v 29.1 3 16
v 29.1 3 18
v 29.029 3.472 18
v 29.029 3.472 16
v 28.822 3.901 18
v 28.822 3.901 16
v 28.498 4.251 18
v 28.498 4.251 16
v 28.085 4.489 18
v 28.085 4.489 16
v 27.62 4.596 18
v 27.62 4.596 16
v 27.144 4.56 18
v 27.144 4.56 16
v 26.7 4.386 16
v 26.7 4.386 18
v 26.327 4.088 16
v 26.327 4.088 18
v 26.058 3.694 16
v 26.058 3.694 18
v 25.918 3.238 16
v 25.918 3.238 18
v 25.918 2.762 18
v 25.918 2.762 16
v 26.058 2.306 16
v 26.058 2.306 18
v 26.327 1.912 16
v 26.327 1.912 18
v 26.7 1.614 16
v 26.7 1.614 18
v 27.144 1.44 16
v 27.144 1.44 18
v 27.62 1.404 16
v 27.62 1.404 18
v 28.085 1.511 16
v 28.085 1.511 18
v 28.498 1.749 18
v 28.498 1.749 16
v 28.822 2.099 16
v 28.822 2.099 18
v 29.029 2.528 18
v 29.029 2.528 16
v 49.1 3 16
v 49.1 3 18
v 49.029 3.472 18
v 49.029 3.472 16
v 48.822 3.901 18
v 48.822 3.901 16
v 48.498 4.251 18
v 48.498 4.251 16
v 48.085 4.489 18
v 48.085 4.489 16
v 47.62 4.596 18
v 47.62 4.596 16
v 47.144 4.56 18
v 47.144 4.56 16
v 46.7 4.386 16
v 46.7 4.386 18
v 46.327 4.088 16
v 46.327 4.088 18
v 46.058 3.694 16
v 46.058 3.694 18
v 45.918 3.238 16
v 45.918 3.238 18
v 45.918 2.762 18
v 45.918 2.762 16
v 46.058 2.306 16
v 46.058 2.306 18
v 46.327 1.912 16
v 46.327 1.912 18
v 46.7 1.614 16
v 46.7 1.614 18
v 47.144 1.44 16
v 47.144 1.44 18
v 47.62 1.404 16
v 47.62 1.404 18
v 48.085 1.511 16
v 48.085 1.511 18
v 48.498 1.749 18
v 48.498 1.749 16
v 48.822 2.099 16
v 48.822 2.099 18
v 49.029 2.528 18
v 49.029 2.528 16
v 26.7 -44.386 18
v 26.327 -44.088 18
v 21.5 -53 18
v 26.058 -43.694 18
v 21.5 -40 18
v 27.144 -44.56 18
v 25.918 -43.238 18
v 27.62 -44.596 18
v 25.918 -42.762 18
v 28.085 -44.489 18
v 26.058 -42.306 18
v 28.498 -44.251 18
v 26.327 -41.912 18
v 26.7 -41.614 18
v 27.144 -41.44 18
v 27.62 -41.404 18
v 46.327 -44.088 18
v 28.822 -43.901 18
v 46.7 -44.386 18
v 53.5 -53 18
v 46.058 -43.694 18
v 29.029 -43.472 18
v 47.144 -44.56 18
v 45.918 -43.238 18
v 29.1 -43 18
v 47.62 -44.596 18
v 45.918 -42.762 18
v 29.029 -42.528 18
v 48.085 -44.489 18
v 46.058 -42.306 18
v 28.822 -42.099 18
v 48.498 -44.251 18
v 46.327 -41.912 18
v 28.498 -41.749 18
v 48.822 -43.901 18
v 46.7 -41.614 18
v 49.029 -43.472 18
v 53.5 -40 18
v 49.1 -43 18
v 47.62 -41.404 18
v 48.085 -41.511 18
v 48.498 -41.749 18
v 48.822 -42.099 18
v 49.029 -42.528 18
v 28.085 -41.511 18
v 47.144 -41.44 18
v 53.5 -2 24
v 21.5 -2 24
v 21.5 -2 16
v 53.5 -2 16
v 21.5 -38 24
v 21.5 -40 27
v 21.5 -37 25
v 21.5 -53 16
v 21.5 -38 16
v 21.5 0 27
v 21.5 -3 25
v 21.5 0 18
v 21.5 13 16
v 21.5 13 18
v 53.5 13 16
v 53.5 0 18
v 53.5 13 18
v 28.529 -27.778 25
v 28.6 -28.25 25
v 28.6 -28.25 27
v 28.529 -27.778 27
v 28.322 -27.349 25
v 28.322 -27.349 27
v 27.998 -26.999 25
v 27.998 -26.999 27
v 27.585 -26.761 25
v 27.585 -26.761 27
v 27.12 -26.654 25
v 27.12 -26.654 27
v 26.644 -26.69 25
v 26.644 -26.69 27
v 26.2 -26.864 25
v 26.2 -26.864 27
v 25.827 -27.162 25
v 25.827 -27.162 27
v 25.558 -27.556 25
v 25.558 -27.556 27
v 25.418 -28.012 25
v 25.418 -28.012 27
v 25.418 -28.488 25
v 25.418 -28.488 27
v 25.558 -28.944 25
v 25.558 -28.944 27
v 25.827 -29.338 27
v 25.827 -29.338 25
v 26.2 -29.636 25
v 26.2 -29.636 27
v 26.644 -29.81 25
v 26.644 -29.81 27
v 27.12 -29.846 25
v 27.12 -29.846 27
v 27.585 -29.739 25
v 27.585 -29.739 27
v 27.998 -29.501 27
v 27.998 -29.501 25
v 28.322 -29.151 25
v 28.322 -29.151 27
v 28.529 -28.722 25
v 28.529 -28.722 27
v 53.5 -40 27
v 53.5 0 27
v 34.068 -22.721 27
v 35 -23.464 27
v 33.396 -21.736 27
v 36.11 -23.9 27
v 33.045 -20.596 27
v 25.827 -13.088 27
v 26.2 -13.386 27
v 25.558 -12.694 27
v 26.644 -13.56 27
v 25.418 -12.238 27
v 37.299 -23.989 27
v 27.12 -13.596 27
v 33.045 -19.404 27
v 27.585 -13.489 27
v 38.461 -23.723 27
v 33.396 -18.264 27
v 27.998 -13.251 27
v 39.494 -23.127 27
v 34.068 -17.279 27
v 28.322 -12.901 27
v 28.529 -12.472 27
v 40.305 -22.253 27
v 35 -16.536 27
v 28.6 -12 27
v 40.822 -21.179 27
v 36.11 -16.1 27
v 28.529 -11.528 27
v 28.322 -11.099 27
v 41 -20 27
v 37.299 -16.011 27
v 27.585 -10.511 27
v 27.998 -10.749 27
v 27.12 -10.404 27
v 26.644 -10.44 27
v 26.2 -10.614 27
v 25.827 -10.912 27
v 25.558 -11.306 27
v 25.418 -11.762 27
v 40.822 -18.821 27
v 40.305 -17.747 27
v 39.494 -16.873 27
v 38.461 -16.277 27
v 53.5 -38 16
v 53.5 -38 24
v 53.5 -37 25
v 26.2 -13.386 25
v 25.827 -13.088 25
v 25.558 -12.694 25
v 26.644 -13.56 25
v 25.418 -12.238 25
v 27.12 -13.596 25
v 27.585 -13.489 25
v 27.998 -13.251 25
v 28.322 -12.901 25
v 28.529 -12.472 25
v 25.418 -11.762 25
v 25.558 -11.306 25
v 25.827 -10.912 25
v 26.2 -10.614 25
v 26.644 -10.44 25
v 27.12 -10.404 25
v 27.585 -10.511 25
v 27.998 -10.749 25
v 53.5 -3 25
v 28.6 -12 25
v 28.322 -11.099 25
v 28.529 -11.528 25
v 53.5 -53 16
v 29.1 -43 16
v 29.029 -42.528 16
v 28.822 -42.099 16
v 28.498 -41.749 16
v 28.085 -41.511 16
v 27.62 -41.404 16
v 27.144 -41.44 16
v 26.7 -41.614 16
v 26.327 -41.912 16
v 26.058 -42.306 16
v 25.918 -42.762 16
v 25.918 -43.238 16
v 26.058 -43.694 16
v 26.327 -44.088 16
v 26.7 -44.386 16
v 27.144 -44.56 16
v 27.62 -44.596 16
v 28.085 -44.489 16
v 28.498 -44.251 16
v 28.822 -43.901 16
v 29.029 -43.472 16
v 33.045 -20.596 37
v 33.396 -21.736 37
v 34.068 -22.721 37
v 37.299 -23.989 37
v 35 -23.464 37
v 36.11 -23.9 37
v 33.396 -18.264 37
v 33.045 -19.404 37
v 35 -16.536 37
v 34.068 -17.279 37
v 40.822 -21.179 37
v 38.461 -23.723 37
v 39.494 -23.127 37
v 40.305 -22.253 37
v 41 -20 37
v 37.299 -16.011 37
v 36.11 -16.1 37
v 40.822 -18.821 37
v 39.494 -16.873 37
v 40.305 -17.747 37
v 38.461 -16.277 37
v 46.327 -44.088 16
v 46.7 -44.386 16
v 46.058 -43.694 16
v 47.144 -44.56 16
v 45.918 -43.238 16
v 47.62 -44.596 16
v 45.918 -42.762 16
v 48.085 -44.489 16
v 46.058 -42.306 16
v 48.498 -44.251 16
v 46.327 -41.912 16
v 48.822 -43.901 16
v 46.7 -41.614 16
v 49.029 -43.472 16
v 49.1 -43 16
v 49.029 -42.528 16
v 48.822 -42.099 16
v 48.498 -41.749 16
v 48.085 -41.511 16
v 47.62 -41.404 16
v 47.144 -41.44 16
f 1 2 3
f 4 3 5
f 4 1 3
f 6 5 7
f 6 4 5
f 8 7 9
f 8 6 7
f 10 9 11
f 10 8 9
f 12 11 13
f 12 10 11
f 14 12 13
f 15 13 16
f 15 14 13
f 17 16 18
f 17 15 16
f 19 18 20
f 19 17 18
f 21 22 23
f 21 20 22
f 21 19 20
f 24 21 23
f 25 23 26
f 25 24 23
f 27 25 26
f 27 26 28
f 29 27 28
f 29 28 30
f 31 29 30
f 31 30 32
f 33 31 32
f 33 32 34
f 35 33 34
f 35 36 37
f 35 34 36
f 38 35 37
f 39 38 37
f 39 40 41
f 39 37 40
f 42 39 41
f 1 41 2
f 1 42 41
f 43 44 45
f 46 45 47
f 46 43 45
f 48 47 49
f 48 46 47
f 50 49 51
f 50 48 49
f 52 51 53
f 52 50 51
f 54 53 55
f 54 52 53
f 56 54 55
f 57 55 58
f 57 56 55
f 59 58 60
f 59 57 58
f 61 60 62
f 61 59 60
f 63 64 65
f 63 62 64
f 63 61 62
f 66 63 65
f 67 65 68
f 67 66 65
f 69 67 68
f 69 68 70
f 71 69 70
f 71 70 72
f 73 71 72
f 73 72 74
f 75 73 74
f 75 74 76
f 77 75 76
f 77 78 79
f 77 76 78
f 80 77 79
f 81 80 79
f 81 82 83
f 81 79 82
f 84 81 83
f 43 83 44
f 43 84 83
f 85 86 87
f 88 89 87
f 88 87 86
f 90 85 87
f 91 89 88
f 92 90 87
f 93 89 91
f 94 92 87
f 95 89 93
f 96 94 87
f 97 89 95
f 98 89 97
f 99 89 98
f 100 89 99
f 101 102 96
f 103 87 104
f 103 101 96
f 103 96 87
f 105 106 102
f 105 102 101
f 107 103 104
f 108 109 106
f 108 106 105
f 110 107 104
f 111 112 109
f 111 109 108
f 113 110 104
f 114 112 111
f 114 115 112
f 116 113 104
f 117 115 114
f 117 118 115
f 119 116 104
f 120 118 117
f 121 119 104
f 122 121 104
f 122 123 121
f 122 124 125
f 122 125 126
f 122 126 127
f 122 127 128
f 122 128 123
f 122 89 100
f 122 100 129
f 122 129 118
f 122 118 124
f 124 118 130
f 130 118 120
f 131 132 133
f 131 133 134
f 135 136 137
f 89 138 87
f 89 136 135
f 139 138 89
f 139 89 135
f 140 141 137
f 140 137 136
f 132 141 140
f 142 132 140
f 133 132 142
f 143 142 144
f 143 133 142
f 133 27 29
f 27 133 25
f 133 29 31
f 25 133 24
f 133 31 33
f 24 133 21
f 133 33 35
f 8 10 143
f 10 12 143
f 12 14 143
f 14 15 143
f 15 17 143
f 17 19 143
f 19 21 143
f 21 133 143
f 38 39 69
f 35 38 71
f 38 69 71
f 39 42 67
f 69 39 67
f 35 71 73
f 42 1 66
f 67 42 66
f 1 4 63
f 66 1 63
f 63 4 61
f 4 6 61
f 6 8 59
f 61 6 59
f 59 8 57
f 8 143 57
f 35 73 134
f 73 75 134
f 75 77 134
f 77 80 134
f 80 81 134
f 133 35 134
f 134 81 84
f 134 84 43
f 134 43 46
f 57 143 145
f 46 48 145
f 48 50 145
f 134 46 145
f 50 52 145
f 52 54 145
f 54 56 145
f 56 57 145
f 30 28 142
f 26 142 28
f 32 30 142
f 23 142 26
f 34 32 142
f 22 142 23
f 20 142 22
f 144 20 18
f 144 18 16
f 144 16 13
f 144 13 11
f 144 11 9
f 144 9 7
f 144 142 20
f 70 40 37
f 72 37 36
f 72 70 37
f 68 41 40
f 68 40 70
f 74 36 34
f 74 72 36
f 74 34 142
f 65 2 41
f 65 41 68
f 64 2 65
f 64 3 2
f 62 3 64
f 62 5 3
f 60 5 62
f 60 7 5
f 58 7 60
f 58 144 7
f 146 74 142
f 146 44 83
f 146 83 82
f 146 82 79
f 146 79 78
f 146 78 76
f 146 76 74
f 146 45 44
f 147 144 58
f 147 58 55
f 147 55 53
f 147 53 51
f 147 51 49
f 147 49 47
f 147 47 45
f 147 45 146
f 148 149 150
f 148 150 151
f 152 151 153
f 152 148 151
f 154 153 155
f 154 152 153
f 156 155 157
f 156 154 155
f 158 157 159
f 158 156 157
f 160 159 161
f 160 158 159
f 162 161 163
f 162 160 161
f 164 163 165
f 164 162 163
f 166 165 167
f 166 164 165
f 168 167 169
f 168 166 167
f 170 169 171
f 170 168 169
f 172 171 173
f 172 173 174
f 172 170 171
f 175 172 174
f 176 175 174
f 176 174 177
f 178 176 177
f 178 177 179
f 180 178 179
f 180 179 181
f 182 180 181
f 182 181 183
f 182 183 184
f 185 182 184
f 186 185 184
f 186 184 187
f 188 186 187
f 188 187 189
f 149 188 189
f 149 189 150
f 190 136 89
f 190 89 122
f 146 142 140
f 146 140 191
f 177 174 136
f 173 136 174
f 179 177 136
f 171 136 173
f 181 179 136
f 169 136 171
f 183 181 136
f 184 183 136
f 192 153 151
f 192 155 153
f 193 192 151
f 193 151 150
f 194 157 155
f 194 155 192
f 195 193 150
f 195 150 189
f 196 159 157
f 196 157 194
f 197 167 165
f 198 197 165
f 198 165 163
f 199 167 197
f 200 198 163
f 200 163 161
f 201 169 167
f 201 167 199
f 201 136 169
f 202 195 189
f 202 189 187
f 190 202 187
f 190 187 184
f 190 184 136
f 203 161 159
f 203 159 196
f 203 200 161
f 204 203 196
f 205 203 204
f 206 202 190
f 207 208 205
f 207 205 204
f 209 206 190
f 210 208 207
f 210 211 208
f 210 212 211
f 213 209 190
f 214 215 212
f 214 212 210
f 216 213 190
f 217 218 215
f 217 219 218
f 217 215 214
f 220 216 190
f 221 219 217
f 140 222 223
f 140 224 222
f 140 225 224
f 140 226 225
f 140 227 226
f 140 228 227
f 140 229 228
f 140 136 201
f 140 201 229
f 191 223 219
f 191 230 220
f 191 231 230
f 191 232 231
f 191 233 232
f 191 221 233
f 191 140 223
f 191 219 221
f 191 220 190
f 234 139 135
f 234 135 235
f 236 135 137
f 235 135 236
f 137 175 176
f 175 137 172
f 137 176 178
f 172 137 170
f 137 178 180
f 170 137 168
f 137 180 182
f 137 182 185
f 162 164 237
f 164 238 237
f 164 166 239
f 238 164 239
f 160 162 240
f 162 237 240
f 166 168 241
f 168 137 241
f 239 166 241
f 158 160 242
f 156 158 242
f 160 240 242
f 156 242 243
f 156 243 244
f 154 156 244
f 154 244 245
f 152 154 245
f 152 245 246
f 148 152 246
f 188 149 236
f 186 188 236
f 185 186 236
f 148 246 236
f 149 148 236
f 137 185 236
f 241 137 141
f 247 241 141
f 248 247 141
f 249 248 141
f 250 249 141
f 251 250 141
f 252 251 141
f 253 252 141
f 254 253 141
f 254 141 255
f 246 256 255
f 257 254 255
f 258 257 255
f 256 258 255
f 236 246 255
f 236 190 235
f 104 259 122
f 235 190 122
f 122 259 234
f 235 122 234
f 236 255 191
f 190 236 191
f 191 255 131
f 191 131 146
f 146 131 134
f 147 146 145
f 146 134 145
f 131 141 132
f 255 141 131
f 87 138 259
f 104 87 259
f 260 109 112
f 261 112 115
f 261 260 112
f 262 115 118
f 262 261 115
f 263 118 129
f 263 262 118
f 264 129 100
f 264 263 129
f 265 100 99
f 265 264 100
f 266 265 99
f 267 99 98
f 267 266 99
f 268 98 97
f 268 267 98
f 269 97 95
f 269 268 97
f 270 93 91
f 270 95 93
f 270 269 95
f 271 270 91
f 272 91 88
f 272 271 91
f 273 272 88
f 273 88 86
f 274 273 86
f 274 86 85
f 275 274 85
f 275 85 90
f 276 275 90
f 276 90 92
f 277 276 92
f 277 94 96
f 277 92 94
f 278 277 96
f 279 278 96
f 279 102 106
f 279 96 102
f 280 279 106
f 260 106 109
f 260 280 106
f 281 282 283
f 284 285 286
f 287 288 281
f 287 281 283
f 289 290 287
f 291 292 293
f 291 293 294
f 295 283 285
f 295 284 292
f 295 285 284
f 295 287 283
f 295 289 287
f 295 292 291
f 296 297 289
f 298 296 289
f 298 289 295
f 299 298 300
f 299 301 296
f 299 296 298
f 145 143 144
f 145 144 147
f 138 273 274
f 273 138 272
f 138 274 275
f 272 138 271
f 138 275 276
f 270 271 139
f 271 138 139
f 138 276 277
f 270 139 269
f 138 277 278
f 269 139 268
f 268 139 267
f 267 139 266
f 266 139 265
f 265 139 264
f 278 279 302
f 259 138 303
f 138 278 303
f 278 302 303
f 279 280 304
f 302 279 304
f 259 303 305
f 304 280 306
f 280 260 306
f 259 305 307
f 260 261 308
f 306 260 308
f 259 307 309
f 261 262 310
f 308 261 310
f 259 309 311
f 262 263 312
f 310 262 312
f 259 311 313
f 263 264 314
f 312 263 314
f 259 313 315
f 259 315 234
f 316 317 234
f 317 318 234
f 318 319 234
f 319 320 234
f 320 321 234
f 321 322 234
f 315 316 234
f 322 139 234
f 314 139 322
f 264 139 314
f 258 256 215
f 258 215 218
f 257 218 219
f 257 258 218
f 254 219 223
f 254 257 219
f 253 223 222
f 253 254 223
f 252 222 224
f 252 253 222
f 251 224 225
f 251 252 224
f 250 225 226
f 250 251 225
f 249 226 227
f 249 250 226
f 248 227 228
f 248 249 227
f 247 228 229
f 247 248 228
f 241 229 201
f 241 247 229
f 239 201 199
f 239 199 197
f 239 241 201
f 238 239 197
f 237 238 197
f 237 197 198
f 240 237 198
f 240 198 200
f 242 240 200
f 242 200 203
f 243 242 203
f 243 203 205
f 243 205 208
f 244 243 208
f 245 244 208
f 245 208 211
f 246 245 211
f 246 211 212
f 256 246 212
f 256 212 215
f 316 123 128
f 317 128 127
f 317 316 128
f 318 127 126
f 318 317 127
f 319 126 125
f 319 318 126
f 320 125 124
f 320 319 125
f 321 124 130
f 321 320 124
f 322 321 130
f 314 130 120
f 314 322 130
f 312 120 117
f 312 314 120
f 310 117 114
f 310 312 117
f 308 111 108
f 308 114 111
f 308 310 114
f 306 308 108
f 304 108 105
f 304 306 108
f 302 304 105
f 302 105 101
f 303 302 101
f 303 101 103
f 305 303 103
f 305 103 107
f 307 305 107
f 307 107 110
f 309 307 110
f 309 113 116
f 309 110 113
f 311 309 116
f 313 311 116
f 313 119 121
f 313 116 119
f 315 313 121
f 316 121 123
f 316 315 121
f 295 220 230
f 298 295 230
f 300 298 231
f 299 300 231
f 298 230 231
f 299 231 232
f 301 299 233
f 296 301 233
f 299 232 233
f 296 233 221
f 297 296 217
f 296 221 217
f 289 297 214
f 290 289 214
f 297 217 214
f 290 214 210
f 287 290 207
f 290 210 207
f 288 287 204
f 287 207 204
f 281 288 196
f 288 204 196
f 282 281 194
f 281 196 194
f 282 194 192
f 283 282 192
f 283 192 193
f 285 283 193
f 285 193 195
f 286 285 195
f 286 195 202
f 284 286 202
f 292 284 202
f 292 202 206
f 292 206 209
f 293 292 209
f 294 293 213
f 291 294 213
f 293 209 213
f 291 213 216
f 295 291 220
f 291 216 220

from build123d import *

# Parameters (mm, degrees)
CYLINDER101_R     = 1.6
CYLINDER101_DEPTH = 3
CYLINDER102_R     = 1.6
CYLINDER102_DEPTH = 3
CYLINDER103_R     = 1.6
CYLINDER103_DEPTH = 3
CYLINDER145_R     = 1.6
CYLINDER145_DEPTH = 3
CYLINDER146_R     = 1.6
CYLINDER146_DEPTH = 3
CYLINDER100_R     = 1.6
CYLINDER100_DEPTH = 3
BOX079_W          = 32
BOX079_H          = 7
BOX079_DEPTH      = 2
BOX014_W          = 32
BOX014_H          = 40
BOX014_DEPTH      = 2
BOX080_W          = 32
BOX080_H          = 7
BOX080_DEPTH      = 2
BOX078_W          = 32
BOX078_H          = 15
BOX078_DEPTH      = 2
CYLINDER_R        = 4
CYLINDER_DEPTH    = 10
BOX077_W          = 32
BOX077_H          = 15
BOX077_DEPTH      = 2
CHAMFER003_SIZE   = 1


with BuildPart() as cylinder101:
    # Cylinder101 → Cylinder101 (new body)
    with BuildSketch(Plane(origin=(47.5, -22, 7), x_dir=(1, 0, 0), z_dir=(0, 0, 1))):
        Circle(CYLINDER101_R)
    extrude(amount=CYLINDER101_DEPTH)


with BuildPart() as cylinder102:
    # Cylinder102 → Cylinder102 (new body)
    with BuildSketch(Plane(origin=(47.5, -68, 7), x_dir=(1, 0, 0), z_dir=(0, 0, 1))):
        Circle(CYLINDER102_R)
    extrude(amount=CYLINDER102_DEPTH)


with BuildPart() as cylinder103:
    # Cylinder103 → Cylinder103 (new body)
    with BuildSketch(Plane(origin=(27.5, -68, 7), x_dir=(1, 0, 0), z_dir=(0, 0, 1))):
        Circle(CYLINDER103_R)
    extrude(amount=CYLINDER103_DEPTH)


with BuildPart() as cylinder145:
    # Cylinder145 → Cylinder145 (new body)
    with BuildSketch(Plane(origin=(27, -37, 15), x_dir=(1, 0, 0), z_dir=(0, 0, 1))):
        Circle(CYLINDER145_R)
    extrude(amount=CYLINDER145_DEPTH)


with BuildPart() as cylinder146:
    # Cylinder146 → Cylinder146 (new body)
    with BuildSketch(Plane(origin=(27, -53.25, 15), x_dir=(1, 0, 0), z_dir=(0, 0, 1))):
        Circle(CYLINDER146_R)
    extrude(amount=CYLINDER146_DEPTH)


with BuildPart() as fusion046:
    # Cylinder100 → Cylinder100 (new body)
    with BuildSketch(Plane(origin=(27.5, -22, 7), x_dir=(1, 0, 0), z_dir=(0, 0, 1))):
        Circle(CYLINDER100_R)
    extrude(amount=CYLINDER100_DEPTH)

    # Fusion046: union Cylinder101, Cylinder102, Cylinder103, Cylinder145, Cylinder146
    add(cylinder101.part)
    add(cylinder102.part)
    add(cylinder103.part)
    add(cylinder145.part)
    add(cylinder146.part)


with BuildPart() as fusion046_1:
    # Fusion046 placement: moved
    add(fusion046.part.moved(Location((0, 25, 9))))


with BuildPart() as cube079:
    # Box079 → Box079 (new body)
    with BuildSketch(Plane(origin=(21.5, 0, 18), x_dir=(1, 0, 0), z_dir=(0, -1, 0))):
        with Locations((16, 3.5)):
            Rectangle(BOX079_W, BOX079_H)
    extrude(amount=BOX079_DEPTH)


with BuildPart() as cube014:
    # Box014 → Box014 (new body)
    with BuildSketch(Plane(origin=(21.5, -40, 25), x_dir=(1, 0, 0), z_dir=(0, 0, 1))):
        with Locations((16, 20)):
            Rectangle(BOX014_W, BOX014_H)
    extrude(amount=BOX014_DEPTH)


with BuildPart() as cube080:
    # Box080 → Box080 (new body)
    with BuildSketch(Plane(origin=(21.5, -38, 18), x_dir=(1, 0, 0), z_dir=(0, -1, 0))):
        with Locations((16, 3.5)):
            Rectangle(BOX080_W, BOX080_H)
    extrude(amount=BOX080_DEPTH)


with BuildPart() as cube078:
    # Box078 → Box078 (new body)
    with BuildSketch(Plane(origin=(21.5, -53, 16), x_dir=(1, 0, 0), z_dir=(0, 0, 1))):
        with Locations((16, 7.5)):
            Rectangle(BOX078_W, BOX078_H)
    extrude(amount=BOX078_DEPTH)


with BuildPart() as cylinder:
    # Cylinder → Cylinder (new body)
    with BuildSketch(Plane(origin=(37, -20, 27), x_dir=(1, 0, 0), z_dir=(0, 0, 1))):
        Circle(CYLINDER_R)
    extrude(amount=CYLINDER_DEPTH)


with BuildPart() as chamfer003:
    # Box077 → Box077 (new body)
    with BuildSketch(Plane(origin=(21.5, -2, 16), x_dir=(1, 0, 0), z_dir=(0, 0, 1))):
        with Locations((16, 7.5)):
            Rectangle(BOX077_W, BOX077_H)
    extrude(amount=BOX077_DEPTH)

    # Fusion105: union Cube079, Cube014, Cube080, Cube078, Cylinder
    add(cube079.part)
    add(cube014.part)
    add(cube080.part)
    add(cube078.part)
    add(cylinder.part)

    # Cut083: cut Fusion046
    add(fusion046_1.part, mode=Mode.SUBTRACT)

    # Chamfer003
    chamfer003_edges = [chamfer003.edges().sort_by_distance(p)[0] for p in [
        (37.5, -2, 25),
        (37.5, -38, 25),
    ]]
    chamfer(chamfer003_edges, length=CHAMFER003_SIZE)


solid = chamfer003.part
